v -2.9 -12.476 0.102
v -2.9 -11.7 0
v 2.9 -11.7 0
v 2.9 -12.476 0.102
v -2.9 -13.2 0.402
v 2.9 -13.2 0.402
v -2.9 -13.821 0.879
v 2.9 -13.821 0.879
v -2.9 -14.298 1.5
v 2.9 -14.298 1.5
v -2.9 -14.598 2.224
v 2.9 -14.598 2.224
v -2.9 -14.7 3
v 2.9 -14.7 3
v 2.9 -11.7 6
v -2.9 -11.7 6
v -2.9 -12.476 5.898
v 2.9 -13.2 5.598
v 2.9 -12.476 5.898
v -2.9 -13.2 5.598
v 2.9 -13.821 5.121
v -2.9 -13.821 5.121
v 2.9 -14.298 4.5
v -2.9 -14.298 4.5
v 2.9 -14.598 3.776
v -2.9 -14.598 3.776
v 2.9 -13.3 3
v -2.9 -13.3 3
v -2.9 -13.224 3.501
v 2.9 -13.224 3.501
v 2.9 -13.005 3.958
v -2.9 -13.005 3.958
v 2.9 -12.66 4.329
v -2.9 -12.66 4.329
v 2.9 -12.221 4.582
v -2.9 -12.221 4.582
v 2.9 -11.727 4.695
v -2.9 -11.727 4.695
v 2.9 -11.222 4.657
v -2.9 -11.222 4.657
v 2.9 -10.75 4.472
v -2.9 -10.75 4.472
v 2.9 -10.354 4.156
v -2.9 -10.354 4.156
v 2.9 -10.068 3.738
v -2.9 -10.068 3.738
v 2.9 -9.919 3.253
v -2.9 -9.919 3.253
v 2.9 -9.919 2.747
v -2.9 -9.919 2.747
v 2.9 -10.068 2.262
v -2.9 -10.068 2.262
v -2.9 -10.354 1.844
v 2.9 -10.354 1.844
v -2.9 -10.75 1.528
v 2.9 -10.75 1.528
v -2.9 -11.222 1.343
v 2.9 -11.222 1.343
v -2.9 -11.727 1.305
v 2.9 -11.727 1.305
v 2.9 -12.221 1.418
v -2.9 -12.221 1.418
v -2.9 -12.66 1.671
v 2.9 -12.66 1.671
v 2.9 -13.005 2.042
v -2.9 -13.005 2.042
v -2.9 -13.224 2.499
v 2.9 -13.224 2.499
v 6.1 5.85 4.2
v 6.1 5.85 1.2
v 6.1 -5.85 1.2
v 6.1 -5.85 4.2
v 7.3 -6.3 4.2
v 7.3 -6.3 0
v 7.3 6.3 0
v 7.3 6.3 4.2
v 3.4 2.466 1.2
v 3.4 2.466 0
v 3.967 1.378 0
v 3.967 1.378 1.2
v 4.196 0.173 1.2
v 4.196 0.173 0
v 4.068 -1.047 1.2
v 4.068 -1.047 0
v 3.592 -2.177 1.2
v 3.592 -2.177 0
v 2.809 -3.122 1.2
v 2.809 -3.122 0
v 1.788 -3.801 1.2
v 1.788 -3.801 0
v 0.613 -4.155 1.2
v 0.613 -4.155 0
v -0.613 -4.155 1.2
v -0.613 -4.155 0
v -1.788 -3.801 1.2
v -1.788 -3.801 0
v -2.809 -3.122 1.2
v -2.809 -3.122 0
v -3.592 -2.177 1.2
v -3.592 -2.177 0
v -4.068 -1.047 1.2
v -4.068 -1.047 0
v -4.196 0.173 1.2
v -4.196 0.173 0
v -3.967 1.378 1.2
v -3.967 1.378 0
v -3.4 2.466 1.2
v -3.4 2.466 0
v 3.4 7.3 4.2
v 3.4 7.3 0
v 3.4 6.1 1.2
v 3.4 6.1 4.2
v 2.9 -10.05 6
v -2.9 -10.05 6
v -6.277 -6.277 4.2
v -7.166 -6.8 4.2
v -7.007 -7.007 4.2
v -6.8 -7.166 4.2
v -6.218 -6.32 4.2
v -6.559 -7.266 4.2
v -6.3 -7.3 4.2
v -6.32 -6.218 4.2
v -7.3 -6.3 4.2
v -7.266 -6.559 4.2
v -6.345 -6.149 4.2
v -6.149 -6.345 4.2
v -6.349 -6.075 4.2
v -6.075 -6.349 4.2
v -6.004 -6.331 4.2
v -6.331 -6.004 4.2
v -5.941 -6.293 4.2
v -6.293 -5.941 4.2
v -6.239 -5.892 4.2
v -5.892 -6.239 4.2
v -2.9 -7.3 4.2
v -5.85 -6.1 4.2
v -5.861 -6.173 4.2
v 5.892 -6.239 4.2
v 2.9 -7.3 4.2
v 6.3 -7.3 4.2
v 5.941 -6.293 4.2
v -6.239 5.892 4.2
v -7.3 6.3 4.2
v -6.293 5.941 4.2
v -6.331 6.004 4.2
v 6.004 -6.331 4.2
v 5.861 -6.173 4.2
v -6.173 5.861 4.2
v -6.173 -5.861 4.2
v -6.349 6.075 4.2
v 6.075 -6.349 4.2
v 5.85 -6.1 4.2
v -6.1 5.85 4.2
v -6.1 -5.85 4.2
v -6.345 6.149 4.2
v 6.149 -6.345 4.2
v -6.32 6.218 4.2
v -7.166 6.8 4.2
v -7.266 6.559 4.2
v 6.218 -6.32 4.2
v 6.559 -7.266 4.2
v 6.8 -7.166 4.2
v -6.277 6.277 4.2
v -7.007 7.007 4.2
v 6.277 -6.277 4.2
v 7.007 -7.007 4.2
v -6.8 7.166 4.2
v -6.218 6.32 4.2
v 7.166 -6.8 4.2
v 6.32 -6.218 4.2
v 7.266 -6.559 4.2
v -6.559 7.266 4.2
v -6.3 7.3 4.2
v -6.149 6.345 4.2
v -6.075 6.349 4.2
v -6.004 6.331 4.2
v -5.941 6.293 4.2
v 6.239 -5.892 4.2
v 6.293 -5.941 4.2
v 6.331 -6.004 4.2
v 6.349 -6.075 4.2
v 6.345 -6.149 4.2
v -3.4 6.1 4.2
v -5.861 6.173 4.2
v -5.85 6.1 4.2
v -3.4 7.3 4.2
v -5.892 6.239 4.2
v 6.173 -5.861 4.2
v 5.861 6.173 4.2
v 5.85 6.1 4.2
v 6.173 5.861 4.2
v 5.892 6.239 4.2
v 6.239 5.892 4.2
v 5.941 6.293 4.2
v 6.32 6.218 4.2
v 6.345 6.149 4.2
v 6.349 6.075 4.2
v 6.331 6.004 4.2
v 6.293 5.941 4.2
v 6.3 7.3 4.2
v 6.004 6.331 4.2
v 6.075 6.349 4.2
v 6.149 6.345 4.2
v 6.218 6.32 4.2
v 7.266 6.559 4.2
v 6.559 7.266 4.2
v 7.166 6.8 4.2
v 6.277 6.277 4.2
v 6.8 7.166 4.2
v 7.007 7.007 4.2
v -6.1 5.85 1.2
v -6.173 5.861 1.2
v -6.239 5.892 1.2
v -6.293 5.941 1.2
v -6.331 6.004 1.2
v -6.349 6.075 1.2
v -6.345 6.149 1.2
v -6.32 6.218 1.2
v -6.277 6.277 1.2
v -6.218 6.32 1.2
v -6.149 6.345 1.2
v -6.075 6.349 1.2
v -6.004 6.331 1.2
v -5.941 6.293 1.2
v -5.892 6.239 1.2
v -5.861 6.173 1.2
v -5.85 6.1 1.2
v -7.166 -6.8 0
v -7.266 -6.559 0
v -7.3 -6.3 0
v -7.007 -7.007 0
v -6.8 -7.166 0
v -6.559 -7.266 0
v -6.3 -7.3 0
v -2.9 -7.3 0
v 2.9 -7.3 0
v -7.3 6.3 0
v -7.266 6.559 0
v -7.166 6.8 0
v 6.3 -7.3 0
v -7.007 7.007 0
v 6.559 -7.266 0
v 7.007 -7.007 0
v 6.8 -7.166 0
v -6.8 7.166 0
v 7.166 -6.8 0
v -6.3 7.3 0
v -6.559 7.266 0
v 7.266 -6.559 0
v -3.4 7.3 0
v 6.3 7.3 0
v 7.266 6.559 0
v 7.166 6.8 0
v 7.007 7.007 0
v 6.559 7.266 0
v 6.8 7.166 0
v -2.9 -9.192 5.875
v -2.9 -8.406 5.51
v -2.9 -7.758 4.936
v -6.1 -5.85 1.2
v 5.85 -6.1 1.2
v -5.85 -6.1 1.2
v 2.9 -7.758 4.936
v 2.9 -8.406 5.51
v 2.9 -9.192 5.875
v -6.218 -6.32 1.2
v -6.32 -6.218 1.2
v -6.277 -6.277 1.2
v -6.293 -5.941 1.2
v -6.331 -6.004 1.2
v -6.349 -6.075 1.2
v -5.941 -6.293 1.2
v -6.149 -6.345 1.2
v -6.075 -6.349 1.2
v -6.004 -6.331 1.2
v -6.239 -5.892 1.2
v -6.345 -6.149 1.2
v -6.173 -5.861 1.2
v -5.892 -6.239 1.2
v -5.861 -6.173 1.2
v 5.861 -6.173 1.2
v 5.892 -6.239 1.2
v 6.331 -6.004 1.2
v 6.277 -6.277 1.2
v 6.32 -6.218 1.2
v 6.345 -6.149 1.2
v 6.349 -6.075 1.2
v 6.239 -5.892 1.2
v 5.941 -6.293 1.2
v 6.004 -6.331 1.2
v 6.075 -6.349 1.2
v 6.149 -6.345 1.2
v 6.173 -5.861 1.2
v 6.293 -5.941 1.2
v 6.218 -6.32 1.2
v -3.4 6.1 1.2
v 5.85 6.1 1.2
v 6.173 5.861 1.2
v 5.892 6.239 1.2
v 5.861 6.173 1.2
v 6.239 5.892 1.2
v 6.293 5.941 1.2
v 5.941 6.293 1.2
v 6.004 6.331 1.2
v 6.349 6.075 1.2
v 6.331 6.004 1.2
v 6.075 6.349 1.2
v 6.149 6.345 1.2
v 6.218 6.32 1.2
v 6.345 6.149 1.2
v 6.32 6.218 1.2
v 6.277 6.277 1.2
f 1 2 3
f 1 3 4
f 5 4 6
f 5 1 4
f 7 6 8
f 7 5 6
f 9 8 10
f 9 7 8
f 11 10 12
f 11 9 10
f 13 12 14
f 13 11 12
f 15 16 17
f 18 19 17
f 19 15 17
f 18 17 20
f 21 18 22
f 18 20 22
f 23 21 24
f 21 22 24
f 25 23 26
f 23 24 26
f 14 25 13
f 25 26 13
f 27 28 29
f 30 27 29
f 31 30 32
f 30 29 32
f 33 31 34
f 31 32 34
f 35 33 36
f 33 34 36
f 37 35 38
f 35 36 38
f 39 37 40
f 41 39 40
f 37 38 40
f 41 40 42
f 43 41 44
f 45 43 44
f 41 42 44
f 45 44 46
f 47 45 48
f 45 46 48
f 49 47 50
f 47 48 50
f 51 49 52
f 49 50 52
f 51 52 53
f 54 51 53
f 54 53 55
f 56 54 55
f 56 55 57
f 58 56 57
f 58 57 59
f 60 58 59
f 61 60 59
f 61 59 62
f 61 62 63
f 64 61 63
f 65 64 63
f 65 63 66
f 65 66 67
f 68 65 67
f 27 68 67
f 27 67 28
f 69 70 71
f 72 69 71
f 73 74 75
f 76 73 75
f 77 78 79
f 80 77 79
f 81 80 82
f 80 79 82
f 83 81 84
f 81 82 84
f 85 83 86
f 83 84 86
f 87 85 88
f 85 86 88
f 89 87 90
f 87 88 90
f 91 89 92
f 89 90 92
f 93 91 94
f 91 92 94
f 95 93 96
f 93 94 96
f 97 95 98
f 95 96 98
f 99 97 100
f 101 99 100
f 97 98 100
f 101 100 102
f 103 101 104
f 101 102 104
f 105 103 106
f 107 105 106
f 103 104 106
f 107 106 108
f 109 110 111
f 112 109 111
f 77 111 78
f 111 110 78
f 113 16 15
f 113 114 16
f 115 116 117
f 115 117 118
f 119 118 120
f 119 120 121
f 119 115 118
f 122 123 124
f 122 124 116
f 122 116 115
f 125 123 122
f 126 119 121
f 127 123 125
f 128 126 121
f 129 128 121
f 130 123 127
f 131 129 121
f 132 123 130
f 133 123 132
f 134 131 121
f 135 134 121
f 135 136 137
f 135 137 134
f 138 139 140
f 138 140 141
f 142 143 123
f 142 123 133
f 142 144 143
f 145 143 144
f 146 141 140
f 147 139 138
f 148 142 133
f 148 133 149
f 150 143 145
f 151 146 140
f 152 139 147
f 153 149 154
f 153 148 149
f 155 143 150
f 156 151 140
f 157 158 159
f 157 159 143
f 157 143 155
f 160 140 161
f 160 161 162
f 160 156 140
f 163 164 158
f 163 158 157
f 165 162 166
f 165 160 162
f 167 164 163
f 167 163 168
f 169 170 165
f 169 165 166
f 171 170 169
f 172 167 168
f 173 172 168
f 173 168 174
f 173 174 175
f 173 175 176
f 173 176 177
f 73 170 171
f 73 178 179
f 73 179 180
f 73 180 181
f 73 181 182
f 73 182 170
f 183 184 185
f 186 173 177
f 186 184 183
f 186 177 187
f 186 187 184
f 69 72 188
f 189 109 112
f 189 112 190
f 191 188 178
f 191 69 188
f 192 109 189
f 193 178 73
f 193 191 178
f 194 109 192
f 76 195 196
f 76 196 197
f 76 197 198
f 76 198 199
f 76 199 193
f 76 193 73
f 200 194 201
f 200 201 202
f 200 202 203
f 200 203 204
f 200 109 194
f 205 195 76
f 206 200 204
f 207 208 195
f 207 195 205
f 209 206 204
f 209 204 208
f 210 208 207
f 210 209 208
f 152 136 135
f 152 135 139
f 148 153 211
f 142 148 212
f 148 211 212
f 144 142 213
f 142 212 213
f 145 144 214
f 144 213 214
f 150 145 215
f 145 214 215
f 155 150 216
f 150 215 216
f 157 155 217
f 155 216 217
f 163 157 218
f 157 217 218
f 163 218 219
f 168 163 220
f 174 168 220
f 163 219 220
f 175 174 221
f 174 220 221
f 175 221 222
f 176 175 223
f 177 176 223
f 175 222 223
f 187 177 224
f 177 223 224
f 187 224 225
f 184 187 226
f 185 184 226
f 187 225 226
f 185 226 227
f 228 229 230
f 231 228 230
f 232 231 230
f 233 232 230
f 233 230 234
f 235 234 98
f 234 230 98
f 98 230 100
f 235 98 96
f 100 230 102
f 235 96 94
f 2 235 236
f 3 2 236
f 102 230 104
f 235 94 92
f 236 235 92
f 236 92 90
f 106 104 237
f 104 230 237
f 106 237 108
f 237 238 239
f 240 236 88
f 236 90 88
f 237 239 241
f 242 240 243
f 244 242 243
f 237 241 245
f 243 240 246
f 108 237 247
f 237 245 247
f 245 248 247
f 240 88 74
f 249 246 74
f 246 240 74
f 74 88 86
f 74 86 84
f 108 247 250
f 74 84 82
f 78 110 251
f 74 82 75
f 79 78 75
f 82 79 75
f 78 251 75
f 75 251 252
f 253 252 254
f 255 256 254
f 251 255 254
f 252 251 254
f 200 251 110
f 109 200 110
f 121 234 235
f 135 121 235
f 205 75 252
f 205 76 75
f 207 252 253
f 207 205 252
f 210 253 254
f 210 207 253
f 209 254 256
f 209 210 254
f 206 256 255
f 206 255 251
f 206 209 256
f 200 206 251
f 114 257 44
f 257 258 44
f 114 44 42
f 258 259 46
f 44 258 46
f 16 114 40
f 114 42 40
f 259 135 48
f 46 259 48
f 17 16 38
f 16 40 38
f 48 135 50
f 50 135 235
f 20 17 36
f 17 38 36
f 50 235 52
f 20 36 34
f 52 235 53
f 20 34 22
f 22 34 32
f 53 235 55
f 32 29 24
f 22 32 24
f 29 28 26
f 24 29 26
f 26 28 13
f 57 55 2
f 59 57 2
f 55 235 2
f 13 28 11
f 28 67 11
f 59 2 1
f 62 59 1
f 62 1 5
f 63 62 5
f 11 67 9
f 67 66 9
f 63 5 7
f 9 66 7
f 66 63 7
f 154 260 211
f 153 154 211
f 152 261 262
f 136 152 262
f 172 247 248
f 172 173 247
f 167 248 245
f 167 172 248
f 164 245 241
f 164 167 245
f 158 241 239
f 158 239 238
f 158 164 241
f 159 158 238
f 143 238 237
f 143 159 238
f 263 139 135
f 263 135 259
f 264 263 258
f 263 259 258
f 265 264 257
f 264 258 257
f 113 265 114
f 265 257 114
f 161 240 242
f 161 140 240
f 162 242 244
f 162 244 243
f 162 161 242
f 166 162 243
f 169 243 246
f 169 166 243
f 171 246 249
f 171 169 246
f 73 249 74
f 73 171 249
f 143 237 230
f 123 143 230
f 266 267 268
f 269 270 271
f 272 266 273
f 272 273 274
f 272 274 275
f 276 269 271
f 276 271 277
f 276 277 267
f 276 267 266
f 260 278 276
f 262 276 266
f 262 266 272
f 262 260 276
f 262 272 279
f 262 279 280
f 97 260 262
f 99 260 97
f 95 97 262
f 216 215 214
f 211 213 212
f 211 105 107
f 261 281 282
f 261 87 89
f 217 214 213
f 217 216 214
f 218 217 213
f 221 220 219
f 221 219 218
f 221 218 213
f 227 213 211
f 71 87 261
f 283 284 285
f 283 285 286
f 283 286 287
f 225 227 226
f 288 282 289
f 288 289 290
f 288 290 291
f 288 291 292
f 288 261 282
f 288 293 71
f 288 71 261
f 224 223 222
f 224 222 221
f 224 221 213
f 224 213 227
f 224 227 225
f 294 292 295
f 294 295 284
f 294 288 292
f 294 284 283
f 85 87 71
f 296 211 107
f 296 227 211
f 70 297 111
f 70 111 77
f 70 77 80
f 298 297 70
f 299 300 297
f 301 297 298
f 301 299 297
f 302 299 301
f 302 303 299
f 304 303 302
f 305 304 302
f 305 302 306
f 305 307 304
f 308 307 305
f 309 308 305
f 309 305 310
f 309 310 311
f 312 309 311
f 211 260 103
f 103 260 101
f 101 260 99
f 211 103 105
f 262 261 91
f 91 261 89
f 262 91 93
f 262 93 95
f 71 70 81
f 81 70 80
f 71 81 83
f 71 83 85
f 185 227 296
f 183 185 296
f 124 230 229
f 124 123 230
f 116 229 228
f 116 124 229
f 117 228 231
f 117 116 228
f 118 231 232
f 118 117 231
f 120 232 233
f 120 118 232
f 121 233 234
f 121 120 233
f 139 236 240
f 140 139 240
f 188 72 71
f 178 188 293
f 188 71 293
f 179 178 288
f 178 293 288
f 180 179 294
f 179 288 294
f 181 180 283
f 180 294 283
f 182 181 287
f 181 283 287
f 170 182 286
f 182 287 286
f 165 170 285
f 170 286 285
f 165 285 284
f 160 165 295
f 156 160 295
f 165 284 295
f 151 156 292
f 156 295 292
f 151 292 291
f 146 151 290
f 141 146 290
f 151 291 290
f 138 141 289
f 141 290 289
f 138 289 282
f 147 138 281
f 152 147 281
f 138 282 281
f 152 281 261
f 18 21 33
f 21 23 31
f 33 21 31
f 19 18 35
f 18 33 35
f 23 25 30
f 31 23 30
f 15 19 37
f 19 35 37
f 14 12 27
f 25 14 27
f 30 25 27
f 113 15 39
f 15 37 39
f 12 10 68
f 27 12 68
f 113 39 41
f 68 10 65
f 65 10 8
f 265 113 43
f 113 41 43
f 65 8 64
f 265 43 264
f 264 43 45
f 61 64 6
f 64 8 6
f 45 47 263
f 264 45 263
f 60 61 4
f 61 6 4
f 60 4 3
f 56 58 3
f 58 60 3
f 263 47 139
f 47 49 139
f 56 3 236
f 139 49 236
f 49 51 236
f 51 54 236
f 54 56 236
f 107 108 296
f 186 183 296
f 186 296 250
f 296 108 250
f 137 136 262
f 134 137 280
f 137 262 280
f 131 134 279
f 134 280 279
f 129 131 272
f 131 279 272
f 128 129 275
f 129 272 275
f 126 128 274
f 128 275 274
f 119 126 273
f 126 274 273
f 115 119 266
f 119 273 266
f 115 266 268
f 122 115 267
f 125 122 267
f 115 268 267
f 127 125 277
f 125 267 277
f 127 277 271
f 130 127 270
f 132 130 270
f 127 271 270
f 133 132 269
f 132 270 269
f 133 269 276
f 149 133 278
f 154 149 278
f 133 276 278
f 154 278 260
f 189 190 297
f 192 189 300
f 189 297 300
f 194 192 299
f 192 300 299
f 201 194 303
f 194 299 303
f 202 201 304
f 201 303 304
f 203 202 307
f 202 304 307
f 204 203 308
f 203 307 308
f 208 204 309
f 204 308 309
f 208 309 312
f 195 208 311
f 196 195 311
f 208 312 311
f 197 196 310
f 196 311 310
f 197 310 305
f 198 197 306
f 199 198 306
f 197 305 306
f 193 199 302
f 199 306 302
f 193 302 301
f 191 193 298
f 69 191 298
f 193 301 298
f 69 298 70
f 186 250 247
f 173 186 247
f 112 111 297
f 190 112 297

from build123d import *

# Parameters (mm, degrees)
F1_DEPTH    = 1.2
F2_DEPTH    = 4.2
F3_DEPTH    = 6
F6_T1_DEPTH = 20.8
F6_T3_DEPTH = 19.5477270849
F7_D        = 3.4
F7_DEPTH    = 7
F7_TIP      = 1.0214630523
F8_R        = 1


# Not quite as in the source:
# - a fillet or chamfer that OpenCascade refuses, or shapes differently, is made with other operations: its cross-section is extruded or revolved along the edge and cut away or added


with BuildPart() as f1:
    # F0 (on Top) → F1 (new body)
    with BuildSketch(Plane.XY):
        with BuildLine():
            Line((-3.4, 6.1), (-5.85, 6.1))
            ThreePointArc((-5.85, 6.1), (-6.2767766953, 6.2767766953), (-6.1, 5.85))
            Line((-6.1, 5.85), (-6.1, -5.85))
            ThreePointArc((-6.1, -5.85), (-6.2767766953, -6.2767766953), (-5.85, -6.1))
            Line((-5.85, -6.1), (5.85, -6.1))
            ThreePointArc((5.85, -6.1), (6.2767766953, -6.2767766953), (6.1, -5.85))
            Line((6.1, -5.85), (6.1, 5.85))
            ThreePointArc((6.1, 5.85), (6.2767766953, 6.2767766953), (5.85, 6.1))
            Line((5.85, 6.1), (3.4, 6.1))
            Line((3.4, 6.1), (3.4, 2.4657656012))
            ThreePointArc((3.4, 2.4657656012), (0, -4.2), (-3.4, 2.4657656012))
            Line((-3.4, 2.4657656012), (-3.4, 6.1))
        make_face()
    extrude(amount=F1_DEPTH)

    # F0 (on Top) → F2 (join)
    with BuildSketch(Plane.XY):
        with BuildLine():
            ThreePointArc((-6.1, 5.85), (-6.2767766953, 6.2767766953), (-5.85, 6.1))
            Line((-5.85, 6.1), (-3.4, 6.1))
            Line((-3.4, 6.1), (-3.4, 7.3))
            Line((-3.4, 7.3), (-7.3, 7.3))
            Line((-7.3, 7.3), (-7.3, -7.3))
            Line((-7.3, -7.3), (-2.9, -7.3))
            Line((-2.9, -7.3), (2.9, -7.3))
            Line((2.9, -7.3), (7.3, -7.3))
            Line((7.3, -7.3), (7.3, 7.3))
            Line((7.3, 7.3), (3.4, 7.3))
            Line((3.4, 7.3), (3.4, 6.1))
            Line((3.4, 6.1), (5.85, 6.1))
            ThreePointArc((5.85, 6.1), (6.2767766953, 6.2767766953), (6.1, 5.85))
            Line((6.1, 5.85), (6.1, -5.85))
            ThreePointArc((6.1, -5.85), (6.2767766953, -6.2767766953), (5.85, -6.1))
            Line((5.85, -6.1), (-5.85, -6.1))
            ThreePointArc((-5.85, -6.1), (-6.2767766953, -6.2767766953), (-6.1, -5.85))
            Line((-6.1, -5.85), (-6.1, 5.85))
        make_face()
    extrude(amount=F2_DEPTH)

    # F0 (on Top) → F3 (join)
    with BuildSketch(Plane.XY):
        Polygon((2.9, -7.3), (-2.9, -7.3), (-2.9, -14.7), (0, -14.7), (2.9, -14.7), align=None)
    extrude(amount=F3_DEPTH)

    # F6: fillet of radius 3 on 3 edges, made by hand

    # F6_s2 → F6_t1 (cut)
    with BuildSketch(Plane.YZ.offset(-10.4)):
        with BuildLine():
            ThreePointArc((-11.7, 0), (-13.8213203436, 0.8786796564), (-14.7, 3))
            Line((-14.7, 3), (-14.7, 0))
            Line((-14.7, 0), (-11.7, 0))
        make_face()
        with BuildLine():
            ThreePointArc((-11.7, 6), (-13.8213203436, 5.1213203436), (-14.7, 3))
            Line((-14.7, 3), (-14.7, 6))
            Line((-14.7, 6), (-11.7, 6))
        make_face()
    extrude(amount=F6_T1_DEPTH, mode=Mode.SUBTRACT)

    # F6_s4 → F6_t3 (cut)
    with BuildSketch(Plane.YZ.offset(-9.7738635424)):
        with BuildLine():
            ThreePointArc((-7.3, 4.2), (-8.4063777445, 5.5099800796), (-10.049545417, 6))
            Line((-10.049545417, 6), (-7.3, 6))
            Line((-7.3, 6), (-7.3, 4.2))
        make_face()
    extrude(amount=F6_T3_DEPTH, mode=Mode.SUBTRACT)

    # F7
    with Locations(Plane.YZ.offset(3)):
        with Locations((-11.6, 3)):
            Hole(F7_D / 2, depth=F7_DEPTH)
            with Locations((0, 0, -(F7_DEPTH + F7_TIP / 2))):  # 118° drill point
                Cone(0, F7_D / 2, F7_TIP, mode=Mode.SUBTRACT)

    # F8
    f8_edges = [f1.edges().sort_by_distance(p)[0] for p in [
        (-7.3, 7.3, 2.1),
        (-7.3, -7.3, 2.1),
        (7.3, 7.3, 2.1),
        (7.3, -7.3, 2.1),
    ]]
    fillet(f8_edges, radius=F8_R)


solid = f1.part
